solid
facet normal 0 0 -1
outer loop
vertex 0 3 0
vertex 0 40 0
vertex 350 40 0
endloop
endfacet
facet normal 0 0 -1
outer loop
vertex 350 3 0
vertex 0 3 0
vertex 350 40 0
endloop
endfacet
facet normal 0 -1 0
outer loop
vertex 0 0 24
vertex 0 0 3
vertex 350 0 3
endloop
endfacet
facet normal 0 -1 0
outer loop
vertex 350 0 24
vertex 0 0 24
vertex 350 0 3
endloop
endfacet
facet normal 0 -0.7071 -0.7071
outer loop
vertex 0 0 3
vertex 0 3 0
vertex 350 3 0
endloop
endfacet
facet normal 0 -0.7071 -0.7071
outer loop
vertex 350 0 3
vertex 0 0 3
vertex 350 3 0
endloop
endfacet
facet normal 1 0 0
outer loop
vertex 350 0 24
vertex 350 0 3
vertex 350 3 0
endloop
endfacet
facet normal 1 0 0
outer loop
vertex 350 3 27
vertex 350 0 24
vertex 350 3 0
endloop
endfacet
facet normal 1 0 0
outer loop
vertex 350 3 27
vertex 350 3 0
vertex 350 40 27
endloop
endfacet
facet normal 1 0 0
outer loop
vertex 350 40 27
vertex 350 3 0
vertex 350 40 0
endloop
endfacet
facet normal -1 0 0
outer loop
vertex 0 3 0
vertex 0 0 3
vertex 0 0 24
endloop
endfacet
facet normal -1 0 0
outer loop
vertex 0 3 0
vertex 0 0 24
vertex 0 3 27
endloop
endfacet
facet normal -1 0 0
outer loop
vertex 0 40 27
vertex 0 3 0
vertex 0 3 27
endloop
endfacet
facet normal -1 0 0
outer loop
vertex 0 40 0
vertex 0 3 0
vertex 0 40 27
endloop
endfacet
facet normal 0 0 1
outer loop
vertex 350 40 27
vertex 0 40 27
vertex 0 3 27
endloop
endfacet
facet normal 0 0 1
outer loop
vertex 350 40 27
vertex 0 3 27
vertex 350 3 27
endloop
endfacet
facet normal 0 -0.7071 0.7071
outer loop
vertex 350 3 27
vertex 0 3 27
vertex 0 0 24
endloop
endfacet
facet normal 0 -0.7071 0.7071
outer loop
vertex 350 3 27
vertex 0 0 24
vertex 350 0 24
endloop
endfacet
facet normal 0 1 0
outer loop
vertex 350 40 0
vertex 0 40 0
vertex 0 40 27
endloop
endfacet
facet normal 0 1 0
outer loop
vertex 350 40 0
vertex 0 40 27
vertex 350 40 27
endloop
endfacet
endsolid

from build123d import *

# Parameters (mm, degrees)
ESQUISSE1_W        = 350
ESQUISSE1_H        = 40
BOSS_EXTRU_1_DEPTH = 27
CHANFREIN1_SIZE    = 3


with BuildPart() as part:
    # Esquisse1 → Boss.-Extru.1 (new body)
    with BuildSketch(Plane.XY):
        with Locations((175, 20)):
            Rectangle(ESQUISSE1_W, ESQUISSE1_H)
    extrude(amount=BOSS_EXTRU_1_DEPTH)

    # Chanfrein1
    chanfrein1_edges = [part.edges().sort_by_distance(p)[0] for p in [
        (175, 0, 0),
        (175, 0, 27),
    ]]
    chamfer(chanfrein1_edges, length=CHANFREIN1_SIZE)


solid = part.part
